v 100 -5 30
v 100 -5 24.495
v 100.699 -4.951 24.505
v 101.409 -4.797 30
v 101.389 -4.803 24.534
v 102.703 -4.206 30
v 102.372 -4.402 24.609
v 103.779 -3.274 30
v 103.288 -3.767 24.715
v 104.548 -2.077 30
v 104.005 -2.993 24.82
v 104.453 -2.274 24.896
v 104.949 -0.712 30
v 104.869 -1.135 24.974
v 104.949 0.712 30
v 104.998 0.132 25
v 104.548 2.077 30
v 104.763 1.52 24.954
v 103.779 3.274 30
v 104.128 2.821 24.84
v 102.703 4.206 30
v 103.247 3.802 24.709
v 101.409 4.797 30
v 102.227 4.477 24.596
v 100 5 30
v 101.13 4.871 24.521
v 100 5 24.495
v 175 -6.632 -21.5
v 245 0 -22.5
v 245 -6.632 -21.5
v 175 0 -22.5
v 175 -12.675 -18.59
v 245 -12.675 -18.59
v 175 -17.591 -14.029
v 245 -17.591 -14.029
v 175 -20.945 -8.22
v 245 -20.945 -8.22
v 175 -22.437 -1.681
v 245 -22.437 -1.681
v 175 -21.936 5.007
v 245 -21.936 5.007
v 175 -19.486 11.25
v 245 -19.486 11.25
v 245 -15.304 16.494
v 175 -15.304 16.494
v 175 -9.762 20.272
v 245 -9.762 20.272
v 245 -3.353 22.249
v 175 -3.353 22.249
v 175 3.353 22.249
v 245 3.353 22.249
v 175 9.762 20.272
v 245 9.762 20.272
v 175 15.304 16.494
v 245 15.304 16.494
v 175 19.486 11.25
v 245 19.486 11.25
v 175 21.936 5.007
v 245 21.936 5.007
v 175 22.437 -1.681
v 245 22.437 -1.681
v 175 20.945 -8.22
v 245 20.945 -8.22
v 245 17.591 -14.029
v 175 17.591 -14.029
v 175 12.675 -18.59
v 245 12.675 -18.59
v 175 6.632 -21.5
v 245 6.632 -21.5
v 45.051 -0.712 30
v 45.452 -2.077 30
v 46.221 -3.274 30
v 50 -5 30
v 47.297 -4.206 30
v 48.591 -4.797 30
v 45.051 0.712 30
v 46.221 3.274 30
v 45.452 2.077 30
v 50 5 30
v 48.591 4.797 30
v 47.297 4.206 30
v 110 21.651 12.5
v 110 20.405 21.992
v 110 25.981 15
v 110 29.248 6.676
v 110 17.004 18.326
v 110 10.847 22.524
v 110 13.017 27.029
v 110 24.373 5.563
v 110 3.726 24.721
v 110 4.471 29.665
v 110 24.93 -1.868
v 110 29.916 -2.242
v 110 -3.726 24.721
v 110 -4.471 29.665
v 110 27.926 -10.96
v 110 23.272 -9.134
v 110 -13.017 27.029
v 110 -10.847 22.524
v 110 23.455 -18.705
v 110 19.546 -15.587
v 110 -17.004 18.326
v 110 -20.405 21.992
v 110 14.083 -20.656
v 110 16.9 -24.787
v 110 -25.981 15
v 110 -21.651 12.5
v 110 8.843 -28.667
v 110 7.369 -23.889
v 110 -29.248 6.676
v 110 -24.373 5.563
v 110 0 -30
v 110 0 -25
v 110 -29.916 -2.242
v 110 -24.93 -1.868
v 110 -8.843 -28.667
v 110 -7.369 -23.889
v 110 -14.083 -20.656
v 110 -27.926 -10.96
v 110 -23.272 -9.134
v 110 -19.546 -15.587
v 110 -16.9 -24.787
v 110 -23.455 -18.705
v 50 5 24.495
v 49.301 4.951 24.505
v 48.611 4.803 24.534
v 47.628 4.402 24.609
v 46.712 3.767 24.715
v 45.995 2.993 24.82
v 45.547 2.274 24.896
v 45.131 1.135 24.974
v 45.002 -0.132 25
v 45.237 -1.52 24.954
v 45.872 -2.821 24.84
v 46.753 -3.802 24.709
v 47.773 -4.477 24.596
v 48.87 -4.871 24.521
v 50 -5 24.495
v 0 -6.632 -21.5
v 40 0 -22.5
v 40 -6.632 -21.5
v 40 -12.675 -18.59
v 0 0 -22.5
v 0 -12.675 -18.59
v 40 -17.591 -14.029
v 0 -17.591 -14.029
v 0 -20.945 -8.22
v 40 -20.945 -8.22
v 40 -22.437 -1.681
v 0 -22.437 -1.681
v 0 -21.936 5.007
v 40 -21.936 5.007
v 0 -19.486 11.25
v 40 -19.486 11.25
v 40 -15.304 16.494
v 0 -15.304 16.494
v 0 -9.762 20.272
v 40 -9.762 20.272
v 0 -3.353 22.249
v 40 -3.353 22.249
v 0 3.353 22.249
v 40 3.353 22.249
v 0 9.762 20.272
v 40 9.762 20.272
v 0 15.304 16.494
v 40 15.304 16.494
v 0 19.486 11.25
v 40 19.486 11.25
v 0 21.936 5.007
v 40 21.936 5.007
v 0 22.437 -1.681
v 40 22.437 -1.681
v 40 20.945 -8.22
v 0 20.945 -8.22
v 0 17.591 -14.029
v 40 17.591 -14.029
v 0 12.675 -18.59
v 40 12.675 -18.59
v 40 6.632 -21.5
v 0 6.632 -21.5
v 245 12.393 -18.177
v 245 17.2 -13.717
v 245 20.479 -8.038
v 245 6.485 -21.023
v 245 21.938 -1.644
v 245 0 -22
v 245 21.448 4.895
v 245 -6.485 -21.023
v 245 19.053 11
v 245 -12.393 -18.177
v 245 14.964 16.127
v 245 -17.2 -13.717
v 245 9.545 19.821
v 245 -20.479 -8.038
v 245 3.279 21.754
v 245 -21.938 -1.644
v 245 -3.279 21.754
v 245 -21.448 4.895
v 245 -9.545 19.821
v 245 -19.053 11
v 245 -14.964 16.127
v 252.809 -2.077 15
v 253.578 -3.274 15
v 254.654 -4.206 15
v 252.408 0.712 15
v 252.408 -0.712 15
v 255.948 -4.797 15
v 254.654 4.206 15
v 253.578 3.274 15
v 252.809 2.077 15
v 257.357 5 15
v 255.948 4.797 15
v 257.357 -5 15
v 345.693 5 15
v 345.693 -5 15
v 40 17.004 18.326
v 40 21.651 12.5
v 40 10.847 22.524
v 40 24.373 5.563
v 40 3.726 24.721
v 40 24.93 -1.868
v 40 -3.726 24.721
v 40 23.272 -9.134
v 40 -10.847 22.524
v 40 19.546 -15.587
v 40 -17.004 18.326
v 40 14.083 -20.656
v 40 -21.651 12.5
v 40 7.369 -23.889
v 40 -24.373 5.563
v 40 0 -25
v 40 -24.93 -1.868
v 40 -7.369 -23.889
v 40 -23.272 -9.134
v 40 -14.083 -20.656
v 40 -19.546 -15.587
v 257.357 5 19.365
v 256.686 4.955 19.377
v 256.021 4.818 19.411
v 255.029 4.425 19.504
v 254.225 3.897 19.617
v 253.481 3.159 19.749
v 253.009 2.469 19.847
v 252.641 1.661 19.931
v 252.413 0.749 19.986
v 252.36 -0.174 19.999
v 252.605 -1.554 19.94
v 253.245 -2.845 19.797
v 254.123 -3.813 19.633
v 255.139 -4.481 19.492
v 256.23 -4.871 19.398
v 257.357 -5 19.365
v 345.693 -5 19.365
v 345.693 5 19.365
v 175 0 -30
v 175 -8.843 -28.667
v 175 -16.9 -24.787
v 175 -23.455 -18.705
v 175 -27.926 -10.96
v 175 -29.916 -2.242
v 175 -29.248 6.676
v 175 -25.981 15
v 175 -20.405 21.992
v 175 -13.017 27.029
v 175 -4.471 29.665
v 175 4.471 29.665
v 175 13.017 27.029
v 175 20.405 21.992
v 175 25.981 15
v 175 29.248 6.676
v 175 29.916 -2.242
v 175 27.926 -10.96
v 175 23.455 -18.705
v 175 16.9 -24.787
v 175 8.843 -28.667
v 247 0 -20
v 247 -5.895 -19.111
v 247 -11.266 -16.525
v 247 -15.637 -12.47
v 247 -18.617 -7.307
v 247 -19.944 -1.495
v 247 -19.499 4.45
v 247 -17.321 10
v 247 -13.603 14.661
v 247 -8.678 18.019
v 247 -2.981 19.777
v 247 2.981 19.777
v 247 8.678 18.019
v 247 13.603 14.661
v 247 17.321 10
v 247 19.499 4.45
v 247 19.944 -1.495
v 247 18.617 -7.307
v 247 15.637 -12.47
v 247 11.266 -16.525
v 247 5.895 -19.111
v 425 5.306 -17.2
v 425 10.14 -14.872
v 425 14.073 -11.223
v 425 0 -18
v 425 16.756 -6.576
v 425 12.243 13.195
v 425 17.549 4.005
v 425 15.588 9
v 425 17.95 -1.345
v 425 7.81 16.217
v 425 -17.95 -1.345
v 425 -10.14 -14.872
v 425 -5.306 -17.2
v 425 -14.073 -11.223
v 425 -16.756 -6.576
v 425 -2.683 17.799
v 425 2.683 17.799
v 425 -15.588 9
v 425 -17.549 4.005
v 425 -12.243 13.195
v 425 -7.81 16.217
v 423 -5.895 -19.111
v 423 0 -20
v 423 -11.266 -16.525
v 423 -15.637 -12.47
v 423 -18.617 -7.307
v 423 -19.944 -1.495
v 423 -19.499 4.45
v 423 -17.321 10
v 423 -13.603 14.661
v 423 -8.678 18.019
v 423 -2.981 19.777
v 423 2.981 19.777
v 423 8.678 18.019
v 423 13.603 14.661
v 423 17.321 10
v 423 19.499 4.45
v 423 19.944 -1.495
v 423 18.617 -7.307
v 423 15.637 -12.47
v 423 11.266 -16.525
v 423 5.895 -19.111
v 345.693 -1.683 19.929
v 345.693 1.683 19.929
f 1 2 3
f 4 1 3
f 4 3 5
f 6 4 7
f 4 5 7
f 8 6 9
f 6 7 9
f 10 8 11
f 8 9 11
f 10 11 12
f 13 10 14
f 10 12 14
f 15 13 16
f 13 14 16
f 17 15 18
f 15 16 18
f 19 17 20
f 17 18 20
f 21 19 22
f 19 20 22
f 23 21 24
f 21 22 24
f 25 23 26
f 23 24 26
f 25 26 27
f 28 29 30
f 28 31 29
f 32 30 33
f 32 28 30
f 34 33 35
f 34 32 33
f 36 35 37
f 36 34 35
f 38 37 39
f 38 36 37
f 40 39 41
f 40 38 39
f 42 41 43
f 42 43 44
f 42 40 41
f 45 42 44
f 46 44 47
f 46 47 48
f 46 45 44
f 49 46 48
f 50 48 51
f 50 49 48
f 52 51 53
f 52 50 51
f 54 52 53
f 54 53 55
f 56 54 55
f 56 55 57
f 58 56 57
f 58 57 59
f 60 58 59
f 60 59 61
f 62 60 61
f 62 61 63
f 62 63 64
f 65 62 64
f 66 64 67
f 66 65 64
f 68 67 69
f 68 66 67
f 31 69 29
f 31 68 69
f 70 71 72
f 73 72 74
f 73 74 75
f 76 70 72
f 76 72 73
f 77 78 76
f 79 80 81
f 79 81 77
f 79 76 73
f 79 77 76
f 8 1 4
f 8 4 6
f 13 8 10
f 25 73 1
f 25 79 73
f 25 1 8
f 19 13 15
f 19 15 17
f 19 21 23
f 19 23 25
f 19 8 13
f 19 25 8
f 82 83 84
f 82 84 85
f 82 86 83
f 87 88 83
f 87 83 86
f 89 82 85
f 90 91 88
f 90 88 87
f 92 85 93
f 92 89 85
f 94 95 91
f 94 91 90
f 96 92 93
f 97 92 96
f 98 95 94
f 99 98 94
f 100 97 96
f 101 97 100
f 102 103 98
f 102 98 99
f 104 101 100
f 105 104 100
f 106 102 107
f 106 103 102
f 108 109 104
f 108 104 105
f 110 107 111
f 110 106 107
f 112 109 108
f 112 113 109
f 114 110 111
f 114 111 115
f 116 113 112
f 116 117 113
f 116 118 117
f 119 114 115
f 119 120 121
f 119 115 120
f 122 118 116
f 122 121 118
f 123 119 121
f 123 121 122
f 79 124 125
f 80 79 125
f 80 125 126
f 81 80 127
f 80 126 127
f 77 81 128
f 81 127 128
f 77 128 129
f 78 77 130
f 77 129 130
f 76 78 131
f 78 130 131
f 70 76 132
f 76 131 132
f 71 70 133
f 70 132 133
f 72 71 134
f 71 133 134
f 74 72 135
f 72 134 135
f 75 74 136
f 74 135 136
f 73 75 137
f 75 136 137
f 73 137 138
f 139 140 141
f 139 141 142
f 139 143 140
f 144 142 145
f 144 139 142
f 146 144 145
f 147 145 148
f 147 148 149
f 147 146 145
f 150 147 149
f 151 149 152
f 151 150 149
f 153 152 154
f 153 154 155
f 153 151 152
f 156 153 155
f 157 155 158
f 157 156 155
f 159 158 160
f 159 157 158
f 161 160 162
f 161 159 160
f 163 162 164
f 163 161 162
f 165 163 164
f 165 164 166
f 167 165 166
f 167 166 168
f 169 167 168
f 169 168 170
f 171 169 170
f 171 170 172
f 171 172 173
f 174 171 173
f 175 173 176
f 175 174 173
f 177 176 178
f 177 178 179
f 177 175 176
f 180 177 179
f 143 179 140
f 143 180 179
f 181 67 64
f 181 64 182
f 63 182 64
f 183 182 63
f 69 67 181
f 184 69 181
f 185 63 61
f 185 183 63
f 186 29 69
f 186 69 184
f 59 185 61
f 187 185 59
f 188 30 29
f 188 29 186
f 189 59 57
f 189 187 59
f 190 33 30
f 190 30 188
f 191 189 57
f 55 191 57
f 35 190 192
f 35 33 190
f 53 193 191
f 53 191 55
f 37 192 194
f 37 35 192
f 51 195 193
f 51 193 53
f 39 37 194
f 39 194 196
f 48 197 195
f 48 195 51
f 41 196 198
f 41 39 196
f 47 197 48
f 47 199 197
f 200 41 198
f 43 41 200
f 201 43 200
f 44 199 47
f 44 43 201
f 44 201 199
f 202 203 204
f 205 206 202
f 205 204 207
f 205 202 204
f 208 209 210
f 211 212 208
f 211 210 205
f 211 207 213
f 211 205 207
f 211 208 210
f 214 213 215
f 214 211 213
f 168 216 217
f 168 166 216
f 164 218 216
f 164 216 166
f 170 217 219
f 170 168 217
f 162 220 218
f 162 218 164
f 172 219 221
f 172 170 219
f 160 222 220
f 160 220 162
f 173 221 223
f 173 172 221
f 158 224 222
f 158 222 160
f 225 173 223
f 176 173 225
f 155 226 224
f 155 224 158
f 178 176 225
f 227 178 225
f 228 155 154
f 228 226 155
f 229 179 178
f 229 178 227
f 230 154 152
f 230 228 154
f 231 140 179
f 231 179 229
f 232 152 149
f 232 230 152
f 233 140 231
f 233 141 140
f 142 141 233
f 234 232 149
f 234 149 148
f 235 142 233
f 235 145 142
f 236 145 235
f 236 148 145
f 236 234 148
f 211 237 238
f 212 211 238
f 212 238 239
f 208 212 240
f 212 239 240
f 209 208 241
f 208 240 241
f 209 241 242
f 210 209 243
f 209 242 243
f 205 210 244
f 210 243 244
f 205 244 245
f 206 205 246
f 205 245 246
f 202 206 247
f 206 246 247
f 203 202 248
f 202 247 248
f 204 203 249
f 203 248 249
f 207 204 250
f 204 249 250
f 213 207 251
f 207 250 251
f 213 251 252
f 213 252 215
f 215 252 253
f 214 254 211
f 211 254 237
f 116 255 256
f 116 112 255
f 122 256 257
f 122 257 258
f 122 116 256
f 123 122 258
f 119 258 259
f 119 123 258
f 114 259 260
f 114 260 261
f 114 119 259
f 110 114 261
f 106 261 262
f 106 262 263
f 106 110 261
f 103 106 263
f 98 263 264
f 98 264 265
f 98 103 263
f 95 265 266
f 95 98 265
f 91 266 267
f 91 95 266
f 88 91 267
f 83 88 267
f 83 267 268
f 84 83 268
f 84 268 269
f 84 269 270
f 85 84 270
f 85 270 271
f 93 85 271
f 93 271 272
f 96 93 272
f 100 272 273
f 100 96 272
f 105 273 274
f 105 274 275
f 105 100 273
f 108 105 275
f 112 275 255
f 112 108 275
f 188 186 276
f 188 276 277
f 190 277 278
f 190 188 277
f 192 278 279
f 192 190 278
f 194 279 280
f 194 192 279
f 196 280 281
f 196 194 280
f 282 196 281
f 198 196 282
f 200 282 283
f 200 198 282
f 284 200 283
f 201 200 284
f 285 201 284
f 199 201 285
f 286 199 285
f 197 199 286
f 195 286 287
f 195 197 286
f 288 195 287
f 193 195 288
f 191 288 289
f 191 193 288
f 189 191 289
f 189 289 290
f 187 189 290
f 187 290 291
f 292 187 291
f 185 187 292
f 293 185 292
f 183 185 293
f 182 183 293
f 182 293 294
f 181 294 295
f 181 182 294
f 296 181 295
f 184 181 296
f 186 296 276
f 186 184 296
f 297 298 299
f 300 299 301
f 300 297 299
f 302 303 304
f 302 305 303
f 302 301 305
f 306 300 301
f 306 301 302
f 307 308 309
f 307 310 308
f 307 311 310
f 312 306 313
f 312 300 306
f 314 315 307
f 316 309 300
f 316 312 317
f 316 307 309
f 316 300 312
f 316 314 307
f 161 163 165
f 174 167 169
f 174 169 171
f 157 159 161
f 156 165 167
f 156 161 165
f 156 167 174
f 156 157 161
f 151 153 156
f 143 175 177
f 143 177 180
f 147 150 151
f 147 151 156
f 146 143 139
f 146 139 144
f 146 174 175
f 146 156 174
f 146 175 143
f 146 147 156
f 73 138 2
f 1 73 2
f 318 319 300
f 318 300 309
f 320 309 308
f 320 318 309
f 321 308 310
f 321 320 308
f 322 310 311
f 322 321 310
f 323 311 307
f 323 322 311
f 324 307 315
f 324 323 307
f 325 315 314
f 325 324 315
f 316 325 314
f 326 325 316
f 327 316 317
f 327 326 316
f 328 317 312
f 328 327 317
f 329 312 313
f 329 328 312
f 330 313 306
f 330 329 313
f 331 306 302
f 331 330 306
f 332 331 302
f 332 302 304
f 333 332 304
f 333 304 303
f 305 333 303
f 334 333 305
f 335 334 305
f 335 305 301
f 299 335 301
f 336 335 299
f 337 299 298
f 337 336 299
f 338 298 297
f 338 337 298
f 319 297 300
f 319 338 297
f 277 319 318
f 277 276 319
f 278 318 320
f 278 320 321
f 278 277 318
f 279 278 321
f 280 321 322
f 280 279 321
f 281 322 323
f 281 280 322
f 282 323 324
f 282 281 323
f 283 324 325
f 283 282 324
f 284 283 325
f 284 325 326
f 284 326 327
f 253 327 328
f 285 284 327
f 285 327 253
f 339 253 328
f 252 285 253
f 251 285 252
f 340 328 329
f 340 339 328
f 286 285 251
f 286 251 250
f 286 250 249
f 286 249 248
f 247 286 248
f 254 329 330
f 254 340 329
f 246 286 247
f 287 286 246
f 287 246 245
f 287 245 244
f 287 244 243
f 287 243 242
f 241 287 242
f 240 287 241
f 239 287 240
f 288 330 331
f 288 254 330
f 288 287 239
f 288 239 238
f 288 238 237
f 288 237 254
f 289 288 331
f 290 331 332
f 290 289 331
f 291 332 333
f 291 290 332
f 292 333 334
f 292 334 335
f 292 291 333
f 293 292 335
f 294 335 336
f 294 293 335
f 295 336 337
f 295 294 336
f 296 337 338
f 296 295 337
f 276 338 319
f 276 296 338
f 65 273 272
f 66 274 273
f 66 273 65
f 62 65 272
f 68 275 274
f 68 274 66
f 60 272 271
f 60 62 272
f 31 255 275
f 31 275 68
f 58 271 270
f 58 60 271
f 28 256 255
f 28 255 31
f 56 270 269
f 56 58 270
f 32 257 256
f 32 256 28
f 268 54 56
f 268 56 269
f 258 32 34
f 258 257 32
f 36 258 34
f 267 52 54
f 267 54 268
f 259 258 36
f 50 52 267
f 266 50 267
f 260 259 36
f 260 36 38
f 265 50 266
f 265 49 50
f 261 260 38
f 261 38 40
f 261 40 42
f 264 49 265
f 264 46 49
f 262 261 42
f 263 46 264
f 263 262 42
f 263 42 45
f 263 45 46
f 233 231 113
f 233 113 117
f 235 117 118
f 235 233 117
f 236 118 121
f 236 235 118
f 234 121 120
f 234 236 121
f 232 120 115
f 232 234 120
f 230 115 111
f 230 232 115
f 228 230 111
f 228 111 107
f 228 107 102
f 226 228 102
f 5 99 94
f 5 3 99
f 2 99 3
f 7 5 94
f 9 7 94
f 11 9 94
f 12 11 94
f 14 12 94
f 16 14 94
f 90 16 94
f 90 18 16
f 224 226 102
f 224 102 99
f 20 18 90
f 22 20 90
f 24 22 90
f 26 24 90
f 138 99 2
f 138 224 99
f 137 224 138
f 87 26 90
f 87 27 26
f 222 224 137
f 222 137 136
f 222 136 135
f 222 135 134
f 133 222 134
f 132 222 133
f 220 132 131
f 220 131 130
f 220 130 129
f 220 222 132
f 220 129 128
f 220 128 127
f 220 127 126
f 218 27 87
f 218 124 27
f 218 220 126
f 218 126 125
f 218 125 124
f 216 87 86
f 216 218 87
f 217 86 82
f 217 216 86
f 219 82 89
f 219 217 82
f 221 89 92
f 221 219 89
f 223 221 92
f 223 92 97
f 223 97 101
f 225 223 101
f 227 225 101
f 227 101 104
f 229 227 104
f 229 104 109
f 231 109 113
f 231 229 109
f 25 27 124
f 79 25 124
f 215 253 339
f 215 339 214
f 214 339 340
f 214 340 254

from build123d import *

# Parameters (mm, degrees)
CHAMFER1_SIZE       = 2
CUT_EXTRUDE2_DEPTH  = 5
CUT_EXTRUDE3_DEPTH  = 5
BOSS_EXTRUDE1_DEPTH = 10


with BuildPart() as part:
    # Sketch2 → Revolve1 (revolve)
    with BuildSketch(Plane(origin=(0, 0, 0), x_dir=(1, 0, 0), z_dir=(0, 1, 0))):
        Polygon((303.786030517, 20), (303.786030517, 0), (325, 0), (425, 0), (425, 20), (325, 20), align=None)
        Polygon((0, 22.5), (0, 0), (303.786030517, 0), (303.786030517, 20), (245, 20), (245, 22.5), (175, 22.5), (175, 30), (110, 30), (110, 25), (40, 25), (40, 22.5), align=None)
    revolve(axis=Axis((325, 0, 0), (-1, 0, 0)))

    # Chamfer1
    chamfer1_edges = [part.edges().sort_by_distance(p)[0] for p in [
        (425, 0, 20),
        (245, 0, 20),
    ]]
    chamfer(chamfer1_edges, length=CHAMFER1_SIZE)

    # Sketch4 → Cut-Extrude2 (cut)
    with BuildSketch(Plane.XY.offset(20)):
        with BuildLine():
            Line((257.357014361, -5), (345.693163579, -5))
            Line((345.693163579, -5), (345.693163579, 5))
            Line((345.693163579, 5), (257.357014361, 5))
            ThreePointArc((257.357014361, 5), (252.357014361, 0), (257.357014361, -5))
        make_face()
    extrude(amount=-CUT_EXTRUDE2_DEPTH, mode=Mode.SUBTRACT)

    # Sketch5 → Cut-Extrude3 (cut)
    with BuildSketch(Plane.XY.offset(25)):
        with BuildLine():
            Line((50, 5), (100, 5))
            ThreePointArc((100, 5), (105, 0), (100, -5))
            Line((100, -5), (50, -5))
            ThreePointArc((50, -5), (45, 0), (50, 5))
        make_face()
    extrude(amount=-CUT_EXTRUDE3_DEPTH, mode=Mode.SUBTRACT)

    # Sketch8 → Boss-Extrude1 (add)
    with BuildSketch(Plane.XY.offset(20)):
        with BuildLine():
            Line((100, 5), (50, 5))
            ThreePointArc((50, 5), (45, 0), (50, -5))
            Line((50, -5), (100, -5))
            ThreePointArc((100, -5), (105, 0), (100, 5))
        make_face()
    extrude(amount=BOSS_EXTRUDE1_DEPTH)


solid = part.part
